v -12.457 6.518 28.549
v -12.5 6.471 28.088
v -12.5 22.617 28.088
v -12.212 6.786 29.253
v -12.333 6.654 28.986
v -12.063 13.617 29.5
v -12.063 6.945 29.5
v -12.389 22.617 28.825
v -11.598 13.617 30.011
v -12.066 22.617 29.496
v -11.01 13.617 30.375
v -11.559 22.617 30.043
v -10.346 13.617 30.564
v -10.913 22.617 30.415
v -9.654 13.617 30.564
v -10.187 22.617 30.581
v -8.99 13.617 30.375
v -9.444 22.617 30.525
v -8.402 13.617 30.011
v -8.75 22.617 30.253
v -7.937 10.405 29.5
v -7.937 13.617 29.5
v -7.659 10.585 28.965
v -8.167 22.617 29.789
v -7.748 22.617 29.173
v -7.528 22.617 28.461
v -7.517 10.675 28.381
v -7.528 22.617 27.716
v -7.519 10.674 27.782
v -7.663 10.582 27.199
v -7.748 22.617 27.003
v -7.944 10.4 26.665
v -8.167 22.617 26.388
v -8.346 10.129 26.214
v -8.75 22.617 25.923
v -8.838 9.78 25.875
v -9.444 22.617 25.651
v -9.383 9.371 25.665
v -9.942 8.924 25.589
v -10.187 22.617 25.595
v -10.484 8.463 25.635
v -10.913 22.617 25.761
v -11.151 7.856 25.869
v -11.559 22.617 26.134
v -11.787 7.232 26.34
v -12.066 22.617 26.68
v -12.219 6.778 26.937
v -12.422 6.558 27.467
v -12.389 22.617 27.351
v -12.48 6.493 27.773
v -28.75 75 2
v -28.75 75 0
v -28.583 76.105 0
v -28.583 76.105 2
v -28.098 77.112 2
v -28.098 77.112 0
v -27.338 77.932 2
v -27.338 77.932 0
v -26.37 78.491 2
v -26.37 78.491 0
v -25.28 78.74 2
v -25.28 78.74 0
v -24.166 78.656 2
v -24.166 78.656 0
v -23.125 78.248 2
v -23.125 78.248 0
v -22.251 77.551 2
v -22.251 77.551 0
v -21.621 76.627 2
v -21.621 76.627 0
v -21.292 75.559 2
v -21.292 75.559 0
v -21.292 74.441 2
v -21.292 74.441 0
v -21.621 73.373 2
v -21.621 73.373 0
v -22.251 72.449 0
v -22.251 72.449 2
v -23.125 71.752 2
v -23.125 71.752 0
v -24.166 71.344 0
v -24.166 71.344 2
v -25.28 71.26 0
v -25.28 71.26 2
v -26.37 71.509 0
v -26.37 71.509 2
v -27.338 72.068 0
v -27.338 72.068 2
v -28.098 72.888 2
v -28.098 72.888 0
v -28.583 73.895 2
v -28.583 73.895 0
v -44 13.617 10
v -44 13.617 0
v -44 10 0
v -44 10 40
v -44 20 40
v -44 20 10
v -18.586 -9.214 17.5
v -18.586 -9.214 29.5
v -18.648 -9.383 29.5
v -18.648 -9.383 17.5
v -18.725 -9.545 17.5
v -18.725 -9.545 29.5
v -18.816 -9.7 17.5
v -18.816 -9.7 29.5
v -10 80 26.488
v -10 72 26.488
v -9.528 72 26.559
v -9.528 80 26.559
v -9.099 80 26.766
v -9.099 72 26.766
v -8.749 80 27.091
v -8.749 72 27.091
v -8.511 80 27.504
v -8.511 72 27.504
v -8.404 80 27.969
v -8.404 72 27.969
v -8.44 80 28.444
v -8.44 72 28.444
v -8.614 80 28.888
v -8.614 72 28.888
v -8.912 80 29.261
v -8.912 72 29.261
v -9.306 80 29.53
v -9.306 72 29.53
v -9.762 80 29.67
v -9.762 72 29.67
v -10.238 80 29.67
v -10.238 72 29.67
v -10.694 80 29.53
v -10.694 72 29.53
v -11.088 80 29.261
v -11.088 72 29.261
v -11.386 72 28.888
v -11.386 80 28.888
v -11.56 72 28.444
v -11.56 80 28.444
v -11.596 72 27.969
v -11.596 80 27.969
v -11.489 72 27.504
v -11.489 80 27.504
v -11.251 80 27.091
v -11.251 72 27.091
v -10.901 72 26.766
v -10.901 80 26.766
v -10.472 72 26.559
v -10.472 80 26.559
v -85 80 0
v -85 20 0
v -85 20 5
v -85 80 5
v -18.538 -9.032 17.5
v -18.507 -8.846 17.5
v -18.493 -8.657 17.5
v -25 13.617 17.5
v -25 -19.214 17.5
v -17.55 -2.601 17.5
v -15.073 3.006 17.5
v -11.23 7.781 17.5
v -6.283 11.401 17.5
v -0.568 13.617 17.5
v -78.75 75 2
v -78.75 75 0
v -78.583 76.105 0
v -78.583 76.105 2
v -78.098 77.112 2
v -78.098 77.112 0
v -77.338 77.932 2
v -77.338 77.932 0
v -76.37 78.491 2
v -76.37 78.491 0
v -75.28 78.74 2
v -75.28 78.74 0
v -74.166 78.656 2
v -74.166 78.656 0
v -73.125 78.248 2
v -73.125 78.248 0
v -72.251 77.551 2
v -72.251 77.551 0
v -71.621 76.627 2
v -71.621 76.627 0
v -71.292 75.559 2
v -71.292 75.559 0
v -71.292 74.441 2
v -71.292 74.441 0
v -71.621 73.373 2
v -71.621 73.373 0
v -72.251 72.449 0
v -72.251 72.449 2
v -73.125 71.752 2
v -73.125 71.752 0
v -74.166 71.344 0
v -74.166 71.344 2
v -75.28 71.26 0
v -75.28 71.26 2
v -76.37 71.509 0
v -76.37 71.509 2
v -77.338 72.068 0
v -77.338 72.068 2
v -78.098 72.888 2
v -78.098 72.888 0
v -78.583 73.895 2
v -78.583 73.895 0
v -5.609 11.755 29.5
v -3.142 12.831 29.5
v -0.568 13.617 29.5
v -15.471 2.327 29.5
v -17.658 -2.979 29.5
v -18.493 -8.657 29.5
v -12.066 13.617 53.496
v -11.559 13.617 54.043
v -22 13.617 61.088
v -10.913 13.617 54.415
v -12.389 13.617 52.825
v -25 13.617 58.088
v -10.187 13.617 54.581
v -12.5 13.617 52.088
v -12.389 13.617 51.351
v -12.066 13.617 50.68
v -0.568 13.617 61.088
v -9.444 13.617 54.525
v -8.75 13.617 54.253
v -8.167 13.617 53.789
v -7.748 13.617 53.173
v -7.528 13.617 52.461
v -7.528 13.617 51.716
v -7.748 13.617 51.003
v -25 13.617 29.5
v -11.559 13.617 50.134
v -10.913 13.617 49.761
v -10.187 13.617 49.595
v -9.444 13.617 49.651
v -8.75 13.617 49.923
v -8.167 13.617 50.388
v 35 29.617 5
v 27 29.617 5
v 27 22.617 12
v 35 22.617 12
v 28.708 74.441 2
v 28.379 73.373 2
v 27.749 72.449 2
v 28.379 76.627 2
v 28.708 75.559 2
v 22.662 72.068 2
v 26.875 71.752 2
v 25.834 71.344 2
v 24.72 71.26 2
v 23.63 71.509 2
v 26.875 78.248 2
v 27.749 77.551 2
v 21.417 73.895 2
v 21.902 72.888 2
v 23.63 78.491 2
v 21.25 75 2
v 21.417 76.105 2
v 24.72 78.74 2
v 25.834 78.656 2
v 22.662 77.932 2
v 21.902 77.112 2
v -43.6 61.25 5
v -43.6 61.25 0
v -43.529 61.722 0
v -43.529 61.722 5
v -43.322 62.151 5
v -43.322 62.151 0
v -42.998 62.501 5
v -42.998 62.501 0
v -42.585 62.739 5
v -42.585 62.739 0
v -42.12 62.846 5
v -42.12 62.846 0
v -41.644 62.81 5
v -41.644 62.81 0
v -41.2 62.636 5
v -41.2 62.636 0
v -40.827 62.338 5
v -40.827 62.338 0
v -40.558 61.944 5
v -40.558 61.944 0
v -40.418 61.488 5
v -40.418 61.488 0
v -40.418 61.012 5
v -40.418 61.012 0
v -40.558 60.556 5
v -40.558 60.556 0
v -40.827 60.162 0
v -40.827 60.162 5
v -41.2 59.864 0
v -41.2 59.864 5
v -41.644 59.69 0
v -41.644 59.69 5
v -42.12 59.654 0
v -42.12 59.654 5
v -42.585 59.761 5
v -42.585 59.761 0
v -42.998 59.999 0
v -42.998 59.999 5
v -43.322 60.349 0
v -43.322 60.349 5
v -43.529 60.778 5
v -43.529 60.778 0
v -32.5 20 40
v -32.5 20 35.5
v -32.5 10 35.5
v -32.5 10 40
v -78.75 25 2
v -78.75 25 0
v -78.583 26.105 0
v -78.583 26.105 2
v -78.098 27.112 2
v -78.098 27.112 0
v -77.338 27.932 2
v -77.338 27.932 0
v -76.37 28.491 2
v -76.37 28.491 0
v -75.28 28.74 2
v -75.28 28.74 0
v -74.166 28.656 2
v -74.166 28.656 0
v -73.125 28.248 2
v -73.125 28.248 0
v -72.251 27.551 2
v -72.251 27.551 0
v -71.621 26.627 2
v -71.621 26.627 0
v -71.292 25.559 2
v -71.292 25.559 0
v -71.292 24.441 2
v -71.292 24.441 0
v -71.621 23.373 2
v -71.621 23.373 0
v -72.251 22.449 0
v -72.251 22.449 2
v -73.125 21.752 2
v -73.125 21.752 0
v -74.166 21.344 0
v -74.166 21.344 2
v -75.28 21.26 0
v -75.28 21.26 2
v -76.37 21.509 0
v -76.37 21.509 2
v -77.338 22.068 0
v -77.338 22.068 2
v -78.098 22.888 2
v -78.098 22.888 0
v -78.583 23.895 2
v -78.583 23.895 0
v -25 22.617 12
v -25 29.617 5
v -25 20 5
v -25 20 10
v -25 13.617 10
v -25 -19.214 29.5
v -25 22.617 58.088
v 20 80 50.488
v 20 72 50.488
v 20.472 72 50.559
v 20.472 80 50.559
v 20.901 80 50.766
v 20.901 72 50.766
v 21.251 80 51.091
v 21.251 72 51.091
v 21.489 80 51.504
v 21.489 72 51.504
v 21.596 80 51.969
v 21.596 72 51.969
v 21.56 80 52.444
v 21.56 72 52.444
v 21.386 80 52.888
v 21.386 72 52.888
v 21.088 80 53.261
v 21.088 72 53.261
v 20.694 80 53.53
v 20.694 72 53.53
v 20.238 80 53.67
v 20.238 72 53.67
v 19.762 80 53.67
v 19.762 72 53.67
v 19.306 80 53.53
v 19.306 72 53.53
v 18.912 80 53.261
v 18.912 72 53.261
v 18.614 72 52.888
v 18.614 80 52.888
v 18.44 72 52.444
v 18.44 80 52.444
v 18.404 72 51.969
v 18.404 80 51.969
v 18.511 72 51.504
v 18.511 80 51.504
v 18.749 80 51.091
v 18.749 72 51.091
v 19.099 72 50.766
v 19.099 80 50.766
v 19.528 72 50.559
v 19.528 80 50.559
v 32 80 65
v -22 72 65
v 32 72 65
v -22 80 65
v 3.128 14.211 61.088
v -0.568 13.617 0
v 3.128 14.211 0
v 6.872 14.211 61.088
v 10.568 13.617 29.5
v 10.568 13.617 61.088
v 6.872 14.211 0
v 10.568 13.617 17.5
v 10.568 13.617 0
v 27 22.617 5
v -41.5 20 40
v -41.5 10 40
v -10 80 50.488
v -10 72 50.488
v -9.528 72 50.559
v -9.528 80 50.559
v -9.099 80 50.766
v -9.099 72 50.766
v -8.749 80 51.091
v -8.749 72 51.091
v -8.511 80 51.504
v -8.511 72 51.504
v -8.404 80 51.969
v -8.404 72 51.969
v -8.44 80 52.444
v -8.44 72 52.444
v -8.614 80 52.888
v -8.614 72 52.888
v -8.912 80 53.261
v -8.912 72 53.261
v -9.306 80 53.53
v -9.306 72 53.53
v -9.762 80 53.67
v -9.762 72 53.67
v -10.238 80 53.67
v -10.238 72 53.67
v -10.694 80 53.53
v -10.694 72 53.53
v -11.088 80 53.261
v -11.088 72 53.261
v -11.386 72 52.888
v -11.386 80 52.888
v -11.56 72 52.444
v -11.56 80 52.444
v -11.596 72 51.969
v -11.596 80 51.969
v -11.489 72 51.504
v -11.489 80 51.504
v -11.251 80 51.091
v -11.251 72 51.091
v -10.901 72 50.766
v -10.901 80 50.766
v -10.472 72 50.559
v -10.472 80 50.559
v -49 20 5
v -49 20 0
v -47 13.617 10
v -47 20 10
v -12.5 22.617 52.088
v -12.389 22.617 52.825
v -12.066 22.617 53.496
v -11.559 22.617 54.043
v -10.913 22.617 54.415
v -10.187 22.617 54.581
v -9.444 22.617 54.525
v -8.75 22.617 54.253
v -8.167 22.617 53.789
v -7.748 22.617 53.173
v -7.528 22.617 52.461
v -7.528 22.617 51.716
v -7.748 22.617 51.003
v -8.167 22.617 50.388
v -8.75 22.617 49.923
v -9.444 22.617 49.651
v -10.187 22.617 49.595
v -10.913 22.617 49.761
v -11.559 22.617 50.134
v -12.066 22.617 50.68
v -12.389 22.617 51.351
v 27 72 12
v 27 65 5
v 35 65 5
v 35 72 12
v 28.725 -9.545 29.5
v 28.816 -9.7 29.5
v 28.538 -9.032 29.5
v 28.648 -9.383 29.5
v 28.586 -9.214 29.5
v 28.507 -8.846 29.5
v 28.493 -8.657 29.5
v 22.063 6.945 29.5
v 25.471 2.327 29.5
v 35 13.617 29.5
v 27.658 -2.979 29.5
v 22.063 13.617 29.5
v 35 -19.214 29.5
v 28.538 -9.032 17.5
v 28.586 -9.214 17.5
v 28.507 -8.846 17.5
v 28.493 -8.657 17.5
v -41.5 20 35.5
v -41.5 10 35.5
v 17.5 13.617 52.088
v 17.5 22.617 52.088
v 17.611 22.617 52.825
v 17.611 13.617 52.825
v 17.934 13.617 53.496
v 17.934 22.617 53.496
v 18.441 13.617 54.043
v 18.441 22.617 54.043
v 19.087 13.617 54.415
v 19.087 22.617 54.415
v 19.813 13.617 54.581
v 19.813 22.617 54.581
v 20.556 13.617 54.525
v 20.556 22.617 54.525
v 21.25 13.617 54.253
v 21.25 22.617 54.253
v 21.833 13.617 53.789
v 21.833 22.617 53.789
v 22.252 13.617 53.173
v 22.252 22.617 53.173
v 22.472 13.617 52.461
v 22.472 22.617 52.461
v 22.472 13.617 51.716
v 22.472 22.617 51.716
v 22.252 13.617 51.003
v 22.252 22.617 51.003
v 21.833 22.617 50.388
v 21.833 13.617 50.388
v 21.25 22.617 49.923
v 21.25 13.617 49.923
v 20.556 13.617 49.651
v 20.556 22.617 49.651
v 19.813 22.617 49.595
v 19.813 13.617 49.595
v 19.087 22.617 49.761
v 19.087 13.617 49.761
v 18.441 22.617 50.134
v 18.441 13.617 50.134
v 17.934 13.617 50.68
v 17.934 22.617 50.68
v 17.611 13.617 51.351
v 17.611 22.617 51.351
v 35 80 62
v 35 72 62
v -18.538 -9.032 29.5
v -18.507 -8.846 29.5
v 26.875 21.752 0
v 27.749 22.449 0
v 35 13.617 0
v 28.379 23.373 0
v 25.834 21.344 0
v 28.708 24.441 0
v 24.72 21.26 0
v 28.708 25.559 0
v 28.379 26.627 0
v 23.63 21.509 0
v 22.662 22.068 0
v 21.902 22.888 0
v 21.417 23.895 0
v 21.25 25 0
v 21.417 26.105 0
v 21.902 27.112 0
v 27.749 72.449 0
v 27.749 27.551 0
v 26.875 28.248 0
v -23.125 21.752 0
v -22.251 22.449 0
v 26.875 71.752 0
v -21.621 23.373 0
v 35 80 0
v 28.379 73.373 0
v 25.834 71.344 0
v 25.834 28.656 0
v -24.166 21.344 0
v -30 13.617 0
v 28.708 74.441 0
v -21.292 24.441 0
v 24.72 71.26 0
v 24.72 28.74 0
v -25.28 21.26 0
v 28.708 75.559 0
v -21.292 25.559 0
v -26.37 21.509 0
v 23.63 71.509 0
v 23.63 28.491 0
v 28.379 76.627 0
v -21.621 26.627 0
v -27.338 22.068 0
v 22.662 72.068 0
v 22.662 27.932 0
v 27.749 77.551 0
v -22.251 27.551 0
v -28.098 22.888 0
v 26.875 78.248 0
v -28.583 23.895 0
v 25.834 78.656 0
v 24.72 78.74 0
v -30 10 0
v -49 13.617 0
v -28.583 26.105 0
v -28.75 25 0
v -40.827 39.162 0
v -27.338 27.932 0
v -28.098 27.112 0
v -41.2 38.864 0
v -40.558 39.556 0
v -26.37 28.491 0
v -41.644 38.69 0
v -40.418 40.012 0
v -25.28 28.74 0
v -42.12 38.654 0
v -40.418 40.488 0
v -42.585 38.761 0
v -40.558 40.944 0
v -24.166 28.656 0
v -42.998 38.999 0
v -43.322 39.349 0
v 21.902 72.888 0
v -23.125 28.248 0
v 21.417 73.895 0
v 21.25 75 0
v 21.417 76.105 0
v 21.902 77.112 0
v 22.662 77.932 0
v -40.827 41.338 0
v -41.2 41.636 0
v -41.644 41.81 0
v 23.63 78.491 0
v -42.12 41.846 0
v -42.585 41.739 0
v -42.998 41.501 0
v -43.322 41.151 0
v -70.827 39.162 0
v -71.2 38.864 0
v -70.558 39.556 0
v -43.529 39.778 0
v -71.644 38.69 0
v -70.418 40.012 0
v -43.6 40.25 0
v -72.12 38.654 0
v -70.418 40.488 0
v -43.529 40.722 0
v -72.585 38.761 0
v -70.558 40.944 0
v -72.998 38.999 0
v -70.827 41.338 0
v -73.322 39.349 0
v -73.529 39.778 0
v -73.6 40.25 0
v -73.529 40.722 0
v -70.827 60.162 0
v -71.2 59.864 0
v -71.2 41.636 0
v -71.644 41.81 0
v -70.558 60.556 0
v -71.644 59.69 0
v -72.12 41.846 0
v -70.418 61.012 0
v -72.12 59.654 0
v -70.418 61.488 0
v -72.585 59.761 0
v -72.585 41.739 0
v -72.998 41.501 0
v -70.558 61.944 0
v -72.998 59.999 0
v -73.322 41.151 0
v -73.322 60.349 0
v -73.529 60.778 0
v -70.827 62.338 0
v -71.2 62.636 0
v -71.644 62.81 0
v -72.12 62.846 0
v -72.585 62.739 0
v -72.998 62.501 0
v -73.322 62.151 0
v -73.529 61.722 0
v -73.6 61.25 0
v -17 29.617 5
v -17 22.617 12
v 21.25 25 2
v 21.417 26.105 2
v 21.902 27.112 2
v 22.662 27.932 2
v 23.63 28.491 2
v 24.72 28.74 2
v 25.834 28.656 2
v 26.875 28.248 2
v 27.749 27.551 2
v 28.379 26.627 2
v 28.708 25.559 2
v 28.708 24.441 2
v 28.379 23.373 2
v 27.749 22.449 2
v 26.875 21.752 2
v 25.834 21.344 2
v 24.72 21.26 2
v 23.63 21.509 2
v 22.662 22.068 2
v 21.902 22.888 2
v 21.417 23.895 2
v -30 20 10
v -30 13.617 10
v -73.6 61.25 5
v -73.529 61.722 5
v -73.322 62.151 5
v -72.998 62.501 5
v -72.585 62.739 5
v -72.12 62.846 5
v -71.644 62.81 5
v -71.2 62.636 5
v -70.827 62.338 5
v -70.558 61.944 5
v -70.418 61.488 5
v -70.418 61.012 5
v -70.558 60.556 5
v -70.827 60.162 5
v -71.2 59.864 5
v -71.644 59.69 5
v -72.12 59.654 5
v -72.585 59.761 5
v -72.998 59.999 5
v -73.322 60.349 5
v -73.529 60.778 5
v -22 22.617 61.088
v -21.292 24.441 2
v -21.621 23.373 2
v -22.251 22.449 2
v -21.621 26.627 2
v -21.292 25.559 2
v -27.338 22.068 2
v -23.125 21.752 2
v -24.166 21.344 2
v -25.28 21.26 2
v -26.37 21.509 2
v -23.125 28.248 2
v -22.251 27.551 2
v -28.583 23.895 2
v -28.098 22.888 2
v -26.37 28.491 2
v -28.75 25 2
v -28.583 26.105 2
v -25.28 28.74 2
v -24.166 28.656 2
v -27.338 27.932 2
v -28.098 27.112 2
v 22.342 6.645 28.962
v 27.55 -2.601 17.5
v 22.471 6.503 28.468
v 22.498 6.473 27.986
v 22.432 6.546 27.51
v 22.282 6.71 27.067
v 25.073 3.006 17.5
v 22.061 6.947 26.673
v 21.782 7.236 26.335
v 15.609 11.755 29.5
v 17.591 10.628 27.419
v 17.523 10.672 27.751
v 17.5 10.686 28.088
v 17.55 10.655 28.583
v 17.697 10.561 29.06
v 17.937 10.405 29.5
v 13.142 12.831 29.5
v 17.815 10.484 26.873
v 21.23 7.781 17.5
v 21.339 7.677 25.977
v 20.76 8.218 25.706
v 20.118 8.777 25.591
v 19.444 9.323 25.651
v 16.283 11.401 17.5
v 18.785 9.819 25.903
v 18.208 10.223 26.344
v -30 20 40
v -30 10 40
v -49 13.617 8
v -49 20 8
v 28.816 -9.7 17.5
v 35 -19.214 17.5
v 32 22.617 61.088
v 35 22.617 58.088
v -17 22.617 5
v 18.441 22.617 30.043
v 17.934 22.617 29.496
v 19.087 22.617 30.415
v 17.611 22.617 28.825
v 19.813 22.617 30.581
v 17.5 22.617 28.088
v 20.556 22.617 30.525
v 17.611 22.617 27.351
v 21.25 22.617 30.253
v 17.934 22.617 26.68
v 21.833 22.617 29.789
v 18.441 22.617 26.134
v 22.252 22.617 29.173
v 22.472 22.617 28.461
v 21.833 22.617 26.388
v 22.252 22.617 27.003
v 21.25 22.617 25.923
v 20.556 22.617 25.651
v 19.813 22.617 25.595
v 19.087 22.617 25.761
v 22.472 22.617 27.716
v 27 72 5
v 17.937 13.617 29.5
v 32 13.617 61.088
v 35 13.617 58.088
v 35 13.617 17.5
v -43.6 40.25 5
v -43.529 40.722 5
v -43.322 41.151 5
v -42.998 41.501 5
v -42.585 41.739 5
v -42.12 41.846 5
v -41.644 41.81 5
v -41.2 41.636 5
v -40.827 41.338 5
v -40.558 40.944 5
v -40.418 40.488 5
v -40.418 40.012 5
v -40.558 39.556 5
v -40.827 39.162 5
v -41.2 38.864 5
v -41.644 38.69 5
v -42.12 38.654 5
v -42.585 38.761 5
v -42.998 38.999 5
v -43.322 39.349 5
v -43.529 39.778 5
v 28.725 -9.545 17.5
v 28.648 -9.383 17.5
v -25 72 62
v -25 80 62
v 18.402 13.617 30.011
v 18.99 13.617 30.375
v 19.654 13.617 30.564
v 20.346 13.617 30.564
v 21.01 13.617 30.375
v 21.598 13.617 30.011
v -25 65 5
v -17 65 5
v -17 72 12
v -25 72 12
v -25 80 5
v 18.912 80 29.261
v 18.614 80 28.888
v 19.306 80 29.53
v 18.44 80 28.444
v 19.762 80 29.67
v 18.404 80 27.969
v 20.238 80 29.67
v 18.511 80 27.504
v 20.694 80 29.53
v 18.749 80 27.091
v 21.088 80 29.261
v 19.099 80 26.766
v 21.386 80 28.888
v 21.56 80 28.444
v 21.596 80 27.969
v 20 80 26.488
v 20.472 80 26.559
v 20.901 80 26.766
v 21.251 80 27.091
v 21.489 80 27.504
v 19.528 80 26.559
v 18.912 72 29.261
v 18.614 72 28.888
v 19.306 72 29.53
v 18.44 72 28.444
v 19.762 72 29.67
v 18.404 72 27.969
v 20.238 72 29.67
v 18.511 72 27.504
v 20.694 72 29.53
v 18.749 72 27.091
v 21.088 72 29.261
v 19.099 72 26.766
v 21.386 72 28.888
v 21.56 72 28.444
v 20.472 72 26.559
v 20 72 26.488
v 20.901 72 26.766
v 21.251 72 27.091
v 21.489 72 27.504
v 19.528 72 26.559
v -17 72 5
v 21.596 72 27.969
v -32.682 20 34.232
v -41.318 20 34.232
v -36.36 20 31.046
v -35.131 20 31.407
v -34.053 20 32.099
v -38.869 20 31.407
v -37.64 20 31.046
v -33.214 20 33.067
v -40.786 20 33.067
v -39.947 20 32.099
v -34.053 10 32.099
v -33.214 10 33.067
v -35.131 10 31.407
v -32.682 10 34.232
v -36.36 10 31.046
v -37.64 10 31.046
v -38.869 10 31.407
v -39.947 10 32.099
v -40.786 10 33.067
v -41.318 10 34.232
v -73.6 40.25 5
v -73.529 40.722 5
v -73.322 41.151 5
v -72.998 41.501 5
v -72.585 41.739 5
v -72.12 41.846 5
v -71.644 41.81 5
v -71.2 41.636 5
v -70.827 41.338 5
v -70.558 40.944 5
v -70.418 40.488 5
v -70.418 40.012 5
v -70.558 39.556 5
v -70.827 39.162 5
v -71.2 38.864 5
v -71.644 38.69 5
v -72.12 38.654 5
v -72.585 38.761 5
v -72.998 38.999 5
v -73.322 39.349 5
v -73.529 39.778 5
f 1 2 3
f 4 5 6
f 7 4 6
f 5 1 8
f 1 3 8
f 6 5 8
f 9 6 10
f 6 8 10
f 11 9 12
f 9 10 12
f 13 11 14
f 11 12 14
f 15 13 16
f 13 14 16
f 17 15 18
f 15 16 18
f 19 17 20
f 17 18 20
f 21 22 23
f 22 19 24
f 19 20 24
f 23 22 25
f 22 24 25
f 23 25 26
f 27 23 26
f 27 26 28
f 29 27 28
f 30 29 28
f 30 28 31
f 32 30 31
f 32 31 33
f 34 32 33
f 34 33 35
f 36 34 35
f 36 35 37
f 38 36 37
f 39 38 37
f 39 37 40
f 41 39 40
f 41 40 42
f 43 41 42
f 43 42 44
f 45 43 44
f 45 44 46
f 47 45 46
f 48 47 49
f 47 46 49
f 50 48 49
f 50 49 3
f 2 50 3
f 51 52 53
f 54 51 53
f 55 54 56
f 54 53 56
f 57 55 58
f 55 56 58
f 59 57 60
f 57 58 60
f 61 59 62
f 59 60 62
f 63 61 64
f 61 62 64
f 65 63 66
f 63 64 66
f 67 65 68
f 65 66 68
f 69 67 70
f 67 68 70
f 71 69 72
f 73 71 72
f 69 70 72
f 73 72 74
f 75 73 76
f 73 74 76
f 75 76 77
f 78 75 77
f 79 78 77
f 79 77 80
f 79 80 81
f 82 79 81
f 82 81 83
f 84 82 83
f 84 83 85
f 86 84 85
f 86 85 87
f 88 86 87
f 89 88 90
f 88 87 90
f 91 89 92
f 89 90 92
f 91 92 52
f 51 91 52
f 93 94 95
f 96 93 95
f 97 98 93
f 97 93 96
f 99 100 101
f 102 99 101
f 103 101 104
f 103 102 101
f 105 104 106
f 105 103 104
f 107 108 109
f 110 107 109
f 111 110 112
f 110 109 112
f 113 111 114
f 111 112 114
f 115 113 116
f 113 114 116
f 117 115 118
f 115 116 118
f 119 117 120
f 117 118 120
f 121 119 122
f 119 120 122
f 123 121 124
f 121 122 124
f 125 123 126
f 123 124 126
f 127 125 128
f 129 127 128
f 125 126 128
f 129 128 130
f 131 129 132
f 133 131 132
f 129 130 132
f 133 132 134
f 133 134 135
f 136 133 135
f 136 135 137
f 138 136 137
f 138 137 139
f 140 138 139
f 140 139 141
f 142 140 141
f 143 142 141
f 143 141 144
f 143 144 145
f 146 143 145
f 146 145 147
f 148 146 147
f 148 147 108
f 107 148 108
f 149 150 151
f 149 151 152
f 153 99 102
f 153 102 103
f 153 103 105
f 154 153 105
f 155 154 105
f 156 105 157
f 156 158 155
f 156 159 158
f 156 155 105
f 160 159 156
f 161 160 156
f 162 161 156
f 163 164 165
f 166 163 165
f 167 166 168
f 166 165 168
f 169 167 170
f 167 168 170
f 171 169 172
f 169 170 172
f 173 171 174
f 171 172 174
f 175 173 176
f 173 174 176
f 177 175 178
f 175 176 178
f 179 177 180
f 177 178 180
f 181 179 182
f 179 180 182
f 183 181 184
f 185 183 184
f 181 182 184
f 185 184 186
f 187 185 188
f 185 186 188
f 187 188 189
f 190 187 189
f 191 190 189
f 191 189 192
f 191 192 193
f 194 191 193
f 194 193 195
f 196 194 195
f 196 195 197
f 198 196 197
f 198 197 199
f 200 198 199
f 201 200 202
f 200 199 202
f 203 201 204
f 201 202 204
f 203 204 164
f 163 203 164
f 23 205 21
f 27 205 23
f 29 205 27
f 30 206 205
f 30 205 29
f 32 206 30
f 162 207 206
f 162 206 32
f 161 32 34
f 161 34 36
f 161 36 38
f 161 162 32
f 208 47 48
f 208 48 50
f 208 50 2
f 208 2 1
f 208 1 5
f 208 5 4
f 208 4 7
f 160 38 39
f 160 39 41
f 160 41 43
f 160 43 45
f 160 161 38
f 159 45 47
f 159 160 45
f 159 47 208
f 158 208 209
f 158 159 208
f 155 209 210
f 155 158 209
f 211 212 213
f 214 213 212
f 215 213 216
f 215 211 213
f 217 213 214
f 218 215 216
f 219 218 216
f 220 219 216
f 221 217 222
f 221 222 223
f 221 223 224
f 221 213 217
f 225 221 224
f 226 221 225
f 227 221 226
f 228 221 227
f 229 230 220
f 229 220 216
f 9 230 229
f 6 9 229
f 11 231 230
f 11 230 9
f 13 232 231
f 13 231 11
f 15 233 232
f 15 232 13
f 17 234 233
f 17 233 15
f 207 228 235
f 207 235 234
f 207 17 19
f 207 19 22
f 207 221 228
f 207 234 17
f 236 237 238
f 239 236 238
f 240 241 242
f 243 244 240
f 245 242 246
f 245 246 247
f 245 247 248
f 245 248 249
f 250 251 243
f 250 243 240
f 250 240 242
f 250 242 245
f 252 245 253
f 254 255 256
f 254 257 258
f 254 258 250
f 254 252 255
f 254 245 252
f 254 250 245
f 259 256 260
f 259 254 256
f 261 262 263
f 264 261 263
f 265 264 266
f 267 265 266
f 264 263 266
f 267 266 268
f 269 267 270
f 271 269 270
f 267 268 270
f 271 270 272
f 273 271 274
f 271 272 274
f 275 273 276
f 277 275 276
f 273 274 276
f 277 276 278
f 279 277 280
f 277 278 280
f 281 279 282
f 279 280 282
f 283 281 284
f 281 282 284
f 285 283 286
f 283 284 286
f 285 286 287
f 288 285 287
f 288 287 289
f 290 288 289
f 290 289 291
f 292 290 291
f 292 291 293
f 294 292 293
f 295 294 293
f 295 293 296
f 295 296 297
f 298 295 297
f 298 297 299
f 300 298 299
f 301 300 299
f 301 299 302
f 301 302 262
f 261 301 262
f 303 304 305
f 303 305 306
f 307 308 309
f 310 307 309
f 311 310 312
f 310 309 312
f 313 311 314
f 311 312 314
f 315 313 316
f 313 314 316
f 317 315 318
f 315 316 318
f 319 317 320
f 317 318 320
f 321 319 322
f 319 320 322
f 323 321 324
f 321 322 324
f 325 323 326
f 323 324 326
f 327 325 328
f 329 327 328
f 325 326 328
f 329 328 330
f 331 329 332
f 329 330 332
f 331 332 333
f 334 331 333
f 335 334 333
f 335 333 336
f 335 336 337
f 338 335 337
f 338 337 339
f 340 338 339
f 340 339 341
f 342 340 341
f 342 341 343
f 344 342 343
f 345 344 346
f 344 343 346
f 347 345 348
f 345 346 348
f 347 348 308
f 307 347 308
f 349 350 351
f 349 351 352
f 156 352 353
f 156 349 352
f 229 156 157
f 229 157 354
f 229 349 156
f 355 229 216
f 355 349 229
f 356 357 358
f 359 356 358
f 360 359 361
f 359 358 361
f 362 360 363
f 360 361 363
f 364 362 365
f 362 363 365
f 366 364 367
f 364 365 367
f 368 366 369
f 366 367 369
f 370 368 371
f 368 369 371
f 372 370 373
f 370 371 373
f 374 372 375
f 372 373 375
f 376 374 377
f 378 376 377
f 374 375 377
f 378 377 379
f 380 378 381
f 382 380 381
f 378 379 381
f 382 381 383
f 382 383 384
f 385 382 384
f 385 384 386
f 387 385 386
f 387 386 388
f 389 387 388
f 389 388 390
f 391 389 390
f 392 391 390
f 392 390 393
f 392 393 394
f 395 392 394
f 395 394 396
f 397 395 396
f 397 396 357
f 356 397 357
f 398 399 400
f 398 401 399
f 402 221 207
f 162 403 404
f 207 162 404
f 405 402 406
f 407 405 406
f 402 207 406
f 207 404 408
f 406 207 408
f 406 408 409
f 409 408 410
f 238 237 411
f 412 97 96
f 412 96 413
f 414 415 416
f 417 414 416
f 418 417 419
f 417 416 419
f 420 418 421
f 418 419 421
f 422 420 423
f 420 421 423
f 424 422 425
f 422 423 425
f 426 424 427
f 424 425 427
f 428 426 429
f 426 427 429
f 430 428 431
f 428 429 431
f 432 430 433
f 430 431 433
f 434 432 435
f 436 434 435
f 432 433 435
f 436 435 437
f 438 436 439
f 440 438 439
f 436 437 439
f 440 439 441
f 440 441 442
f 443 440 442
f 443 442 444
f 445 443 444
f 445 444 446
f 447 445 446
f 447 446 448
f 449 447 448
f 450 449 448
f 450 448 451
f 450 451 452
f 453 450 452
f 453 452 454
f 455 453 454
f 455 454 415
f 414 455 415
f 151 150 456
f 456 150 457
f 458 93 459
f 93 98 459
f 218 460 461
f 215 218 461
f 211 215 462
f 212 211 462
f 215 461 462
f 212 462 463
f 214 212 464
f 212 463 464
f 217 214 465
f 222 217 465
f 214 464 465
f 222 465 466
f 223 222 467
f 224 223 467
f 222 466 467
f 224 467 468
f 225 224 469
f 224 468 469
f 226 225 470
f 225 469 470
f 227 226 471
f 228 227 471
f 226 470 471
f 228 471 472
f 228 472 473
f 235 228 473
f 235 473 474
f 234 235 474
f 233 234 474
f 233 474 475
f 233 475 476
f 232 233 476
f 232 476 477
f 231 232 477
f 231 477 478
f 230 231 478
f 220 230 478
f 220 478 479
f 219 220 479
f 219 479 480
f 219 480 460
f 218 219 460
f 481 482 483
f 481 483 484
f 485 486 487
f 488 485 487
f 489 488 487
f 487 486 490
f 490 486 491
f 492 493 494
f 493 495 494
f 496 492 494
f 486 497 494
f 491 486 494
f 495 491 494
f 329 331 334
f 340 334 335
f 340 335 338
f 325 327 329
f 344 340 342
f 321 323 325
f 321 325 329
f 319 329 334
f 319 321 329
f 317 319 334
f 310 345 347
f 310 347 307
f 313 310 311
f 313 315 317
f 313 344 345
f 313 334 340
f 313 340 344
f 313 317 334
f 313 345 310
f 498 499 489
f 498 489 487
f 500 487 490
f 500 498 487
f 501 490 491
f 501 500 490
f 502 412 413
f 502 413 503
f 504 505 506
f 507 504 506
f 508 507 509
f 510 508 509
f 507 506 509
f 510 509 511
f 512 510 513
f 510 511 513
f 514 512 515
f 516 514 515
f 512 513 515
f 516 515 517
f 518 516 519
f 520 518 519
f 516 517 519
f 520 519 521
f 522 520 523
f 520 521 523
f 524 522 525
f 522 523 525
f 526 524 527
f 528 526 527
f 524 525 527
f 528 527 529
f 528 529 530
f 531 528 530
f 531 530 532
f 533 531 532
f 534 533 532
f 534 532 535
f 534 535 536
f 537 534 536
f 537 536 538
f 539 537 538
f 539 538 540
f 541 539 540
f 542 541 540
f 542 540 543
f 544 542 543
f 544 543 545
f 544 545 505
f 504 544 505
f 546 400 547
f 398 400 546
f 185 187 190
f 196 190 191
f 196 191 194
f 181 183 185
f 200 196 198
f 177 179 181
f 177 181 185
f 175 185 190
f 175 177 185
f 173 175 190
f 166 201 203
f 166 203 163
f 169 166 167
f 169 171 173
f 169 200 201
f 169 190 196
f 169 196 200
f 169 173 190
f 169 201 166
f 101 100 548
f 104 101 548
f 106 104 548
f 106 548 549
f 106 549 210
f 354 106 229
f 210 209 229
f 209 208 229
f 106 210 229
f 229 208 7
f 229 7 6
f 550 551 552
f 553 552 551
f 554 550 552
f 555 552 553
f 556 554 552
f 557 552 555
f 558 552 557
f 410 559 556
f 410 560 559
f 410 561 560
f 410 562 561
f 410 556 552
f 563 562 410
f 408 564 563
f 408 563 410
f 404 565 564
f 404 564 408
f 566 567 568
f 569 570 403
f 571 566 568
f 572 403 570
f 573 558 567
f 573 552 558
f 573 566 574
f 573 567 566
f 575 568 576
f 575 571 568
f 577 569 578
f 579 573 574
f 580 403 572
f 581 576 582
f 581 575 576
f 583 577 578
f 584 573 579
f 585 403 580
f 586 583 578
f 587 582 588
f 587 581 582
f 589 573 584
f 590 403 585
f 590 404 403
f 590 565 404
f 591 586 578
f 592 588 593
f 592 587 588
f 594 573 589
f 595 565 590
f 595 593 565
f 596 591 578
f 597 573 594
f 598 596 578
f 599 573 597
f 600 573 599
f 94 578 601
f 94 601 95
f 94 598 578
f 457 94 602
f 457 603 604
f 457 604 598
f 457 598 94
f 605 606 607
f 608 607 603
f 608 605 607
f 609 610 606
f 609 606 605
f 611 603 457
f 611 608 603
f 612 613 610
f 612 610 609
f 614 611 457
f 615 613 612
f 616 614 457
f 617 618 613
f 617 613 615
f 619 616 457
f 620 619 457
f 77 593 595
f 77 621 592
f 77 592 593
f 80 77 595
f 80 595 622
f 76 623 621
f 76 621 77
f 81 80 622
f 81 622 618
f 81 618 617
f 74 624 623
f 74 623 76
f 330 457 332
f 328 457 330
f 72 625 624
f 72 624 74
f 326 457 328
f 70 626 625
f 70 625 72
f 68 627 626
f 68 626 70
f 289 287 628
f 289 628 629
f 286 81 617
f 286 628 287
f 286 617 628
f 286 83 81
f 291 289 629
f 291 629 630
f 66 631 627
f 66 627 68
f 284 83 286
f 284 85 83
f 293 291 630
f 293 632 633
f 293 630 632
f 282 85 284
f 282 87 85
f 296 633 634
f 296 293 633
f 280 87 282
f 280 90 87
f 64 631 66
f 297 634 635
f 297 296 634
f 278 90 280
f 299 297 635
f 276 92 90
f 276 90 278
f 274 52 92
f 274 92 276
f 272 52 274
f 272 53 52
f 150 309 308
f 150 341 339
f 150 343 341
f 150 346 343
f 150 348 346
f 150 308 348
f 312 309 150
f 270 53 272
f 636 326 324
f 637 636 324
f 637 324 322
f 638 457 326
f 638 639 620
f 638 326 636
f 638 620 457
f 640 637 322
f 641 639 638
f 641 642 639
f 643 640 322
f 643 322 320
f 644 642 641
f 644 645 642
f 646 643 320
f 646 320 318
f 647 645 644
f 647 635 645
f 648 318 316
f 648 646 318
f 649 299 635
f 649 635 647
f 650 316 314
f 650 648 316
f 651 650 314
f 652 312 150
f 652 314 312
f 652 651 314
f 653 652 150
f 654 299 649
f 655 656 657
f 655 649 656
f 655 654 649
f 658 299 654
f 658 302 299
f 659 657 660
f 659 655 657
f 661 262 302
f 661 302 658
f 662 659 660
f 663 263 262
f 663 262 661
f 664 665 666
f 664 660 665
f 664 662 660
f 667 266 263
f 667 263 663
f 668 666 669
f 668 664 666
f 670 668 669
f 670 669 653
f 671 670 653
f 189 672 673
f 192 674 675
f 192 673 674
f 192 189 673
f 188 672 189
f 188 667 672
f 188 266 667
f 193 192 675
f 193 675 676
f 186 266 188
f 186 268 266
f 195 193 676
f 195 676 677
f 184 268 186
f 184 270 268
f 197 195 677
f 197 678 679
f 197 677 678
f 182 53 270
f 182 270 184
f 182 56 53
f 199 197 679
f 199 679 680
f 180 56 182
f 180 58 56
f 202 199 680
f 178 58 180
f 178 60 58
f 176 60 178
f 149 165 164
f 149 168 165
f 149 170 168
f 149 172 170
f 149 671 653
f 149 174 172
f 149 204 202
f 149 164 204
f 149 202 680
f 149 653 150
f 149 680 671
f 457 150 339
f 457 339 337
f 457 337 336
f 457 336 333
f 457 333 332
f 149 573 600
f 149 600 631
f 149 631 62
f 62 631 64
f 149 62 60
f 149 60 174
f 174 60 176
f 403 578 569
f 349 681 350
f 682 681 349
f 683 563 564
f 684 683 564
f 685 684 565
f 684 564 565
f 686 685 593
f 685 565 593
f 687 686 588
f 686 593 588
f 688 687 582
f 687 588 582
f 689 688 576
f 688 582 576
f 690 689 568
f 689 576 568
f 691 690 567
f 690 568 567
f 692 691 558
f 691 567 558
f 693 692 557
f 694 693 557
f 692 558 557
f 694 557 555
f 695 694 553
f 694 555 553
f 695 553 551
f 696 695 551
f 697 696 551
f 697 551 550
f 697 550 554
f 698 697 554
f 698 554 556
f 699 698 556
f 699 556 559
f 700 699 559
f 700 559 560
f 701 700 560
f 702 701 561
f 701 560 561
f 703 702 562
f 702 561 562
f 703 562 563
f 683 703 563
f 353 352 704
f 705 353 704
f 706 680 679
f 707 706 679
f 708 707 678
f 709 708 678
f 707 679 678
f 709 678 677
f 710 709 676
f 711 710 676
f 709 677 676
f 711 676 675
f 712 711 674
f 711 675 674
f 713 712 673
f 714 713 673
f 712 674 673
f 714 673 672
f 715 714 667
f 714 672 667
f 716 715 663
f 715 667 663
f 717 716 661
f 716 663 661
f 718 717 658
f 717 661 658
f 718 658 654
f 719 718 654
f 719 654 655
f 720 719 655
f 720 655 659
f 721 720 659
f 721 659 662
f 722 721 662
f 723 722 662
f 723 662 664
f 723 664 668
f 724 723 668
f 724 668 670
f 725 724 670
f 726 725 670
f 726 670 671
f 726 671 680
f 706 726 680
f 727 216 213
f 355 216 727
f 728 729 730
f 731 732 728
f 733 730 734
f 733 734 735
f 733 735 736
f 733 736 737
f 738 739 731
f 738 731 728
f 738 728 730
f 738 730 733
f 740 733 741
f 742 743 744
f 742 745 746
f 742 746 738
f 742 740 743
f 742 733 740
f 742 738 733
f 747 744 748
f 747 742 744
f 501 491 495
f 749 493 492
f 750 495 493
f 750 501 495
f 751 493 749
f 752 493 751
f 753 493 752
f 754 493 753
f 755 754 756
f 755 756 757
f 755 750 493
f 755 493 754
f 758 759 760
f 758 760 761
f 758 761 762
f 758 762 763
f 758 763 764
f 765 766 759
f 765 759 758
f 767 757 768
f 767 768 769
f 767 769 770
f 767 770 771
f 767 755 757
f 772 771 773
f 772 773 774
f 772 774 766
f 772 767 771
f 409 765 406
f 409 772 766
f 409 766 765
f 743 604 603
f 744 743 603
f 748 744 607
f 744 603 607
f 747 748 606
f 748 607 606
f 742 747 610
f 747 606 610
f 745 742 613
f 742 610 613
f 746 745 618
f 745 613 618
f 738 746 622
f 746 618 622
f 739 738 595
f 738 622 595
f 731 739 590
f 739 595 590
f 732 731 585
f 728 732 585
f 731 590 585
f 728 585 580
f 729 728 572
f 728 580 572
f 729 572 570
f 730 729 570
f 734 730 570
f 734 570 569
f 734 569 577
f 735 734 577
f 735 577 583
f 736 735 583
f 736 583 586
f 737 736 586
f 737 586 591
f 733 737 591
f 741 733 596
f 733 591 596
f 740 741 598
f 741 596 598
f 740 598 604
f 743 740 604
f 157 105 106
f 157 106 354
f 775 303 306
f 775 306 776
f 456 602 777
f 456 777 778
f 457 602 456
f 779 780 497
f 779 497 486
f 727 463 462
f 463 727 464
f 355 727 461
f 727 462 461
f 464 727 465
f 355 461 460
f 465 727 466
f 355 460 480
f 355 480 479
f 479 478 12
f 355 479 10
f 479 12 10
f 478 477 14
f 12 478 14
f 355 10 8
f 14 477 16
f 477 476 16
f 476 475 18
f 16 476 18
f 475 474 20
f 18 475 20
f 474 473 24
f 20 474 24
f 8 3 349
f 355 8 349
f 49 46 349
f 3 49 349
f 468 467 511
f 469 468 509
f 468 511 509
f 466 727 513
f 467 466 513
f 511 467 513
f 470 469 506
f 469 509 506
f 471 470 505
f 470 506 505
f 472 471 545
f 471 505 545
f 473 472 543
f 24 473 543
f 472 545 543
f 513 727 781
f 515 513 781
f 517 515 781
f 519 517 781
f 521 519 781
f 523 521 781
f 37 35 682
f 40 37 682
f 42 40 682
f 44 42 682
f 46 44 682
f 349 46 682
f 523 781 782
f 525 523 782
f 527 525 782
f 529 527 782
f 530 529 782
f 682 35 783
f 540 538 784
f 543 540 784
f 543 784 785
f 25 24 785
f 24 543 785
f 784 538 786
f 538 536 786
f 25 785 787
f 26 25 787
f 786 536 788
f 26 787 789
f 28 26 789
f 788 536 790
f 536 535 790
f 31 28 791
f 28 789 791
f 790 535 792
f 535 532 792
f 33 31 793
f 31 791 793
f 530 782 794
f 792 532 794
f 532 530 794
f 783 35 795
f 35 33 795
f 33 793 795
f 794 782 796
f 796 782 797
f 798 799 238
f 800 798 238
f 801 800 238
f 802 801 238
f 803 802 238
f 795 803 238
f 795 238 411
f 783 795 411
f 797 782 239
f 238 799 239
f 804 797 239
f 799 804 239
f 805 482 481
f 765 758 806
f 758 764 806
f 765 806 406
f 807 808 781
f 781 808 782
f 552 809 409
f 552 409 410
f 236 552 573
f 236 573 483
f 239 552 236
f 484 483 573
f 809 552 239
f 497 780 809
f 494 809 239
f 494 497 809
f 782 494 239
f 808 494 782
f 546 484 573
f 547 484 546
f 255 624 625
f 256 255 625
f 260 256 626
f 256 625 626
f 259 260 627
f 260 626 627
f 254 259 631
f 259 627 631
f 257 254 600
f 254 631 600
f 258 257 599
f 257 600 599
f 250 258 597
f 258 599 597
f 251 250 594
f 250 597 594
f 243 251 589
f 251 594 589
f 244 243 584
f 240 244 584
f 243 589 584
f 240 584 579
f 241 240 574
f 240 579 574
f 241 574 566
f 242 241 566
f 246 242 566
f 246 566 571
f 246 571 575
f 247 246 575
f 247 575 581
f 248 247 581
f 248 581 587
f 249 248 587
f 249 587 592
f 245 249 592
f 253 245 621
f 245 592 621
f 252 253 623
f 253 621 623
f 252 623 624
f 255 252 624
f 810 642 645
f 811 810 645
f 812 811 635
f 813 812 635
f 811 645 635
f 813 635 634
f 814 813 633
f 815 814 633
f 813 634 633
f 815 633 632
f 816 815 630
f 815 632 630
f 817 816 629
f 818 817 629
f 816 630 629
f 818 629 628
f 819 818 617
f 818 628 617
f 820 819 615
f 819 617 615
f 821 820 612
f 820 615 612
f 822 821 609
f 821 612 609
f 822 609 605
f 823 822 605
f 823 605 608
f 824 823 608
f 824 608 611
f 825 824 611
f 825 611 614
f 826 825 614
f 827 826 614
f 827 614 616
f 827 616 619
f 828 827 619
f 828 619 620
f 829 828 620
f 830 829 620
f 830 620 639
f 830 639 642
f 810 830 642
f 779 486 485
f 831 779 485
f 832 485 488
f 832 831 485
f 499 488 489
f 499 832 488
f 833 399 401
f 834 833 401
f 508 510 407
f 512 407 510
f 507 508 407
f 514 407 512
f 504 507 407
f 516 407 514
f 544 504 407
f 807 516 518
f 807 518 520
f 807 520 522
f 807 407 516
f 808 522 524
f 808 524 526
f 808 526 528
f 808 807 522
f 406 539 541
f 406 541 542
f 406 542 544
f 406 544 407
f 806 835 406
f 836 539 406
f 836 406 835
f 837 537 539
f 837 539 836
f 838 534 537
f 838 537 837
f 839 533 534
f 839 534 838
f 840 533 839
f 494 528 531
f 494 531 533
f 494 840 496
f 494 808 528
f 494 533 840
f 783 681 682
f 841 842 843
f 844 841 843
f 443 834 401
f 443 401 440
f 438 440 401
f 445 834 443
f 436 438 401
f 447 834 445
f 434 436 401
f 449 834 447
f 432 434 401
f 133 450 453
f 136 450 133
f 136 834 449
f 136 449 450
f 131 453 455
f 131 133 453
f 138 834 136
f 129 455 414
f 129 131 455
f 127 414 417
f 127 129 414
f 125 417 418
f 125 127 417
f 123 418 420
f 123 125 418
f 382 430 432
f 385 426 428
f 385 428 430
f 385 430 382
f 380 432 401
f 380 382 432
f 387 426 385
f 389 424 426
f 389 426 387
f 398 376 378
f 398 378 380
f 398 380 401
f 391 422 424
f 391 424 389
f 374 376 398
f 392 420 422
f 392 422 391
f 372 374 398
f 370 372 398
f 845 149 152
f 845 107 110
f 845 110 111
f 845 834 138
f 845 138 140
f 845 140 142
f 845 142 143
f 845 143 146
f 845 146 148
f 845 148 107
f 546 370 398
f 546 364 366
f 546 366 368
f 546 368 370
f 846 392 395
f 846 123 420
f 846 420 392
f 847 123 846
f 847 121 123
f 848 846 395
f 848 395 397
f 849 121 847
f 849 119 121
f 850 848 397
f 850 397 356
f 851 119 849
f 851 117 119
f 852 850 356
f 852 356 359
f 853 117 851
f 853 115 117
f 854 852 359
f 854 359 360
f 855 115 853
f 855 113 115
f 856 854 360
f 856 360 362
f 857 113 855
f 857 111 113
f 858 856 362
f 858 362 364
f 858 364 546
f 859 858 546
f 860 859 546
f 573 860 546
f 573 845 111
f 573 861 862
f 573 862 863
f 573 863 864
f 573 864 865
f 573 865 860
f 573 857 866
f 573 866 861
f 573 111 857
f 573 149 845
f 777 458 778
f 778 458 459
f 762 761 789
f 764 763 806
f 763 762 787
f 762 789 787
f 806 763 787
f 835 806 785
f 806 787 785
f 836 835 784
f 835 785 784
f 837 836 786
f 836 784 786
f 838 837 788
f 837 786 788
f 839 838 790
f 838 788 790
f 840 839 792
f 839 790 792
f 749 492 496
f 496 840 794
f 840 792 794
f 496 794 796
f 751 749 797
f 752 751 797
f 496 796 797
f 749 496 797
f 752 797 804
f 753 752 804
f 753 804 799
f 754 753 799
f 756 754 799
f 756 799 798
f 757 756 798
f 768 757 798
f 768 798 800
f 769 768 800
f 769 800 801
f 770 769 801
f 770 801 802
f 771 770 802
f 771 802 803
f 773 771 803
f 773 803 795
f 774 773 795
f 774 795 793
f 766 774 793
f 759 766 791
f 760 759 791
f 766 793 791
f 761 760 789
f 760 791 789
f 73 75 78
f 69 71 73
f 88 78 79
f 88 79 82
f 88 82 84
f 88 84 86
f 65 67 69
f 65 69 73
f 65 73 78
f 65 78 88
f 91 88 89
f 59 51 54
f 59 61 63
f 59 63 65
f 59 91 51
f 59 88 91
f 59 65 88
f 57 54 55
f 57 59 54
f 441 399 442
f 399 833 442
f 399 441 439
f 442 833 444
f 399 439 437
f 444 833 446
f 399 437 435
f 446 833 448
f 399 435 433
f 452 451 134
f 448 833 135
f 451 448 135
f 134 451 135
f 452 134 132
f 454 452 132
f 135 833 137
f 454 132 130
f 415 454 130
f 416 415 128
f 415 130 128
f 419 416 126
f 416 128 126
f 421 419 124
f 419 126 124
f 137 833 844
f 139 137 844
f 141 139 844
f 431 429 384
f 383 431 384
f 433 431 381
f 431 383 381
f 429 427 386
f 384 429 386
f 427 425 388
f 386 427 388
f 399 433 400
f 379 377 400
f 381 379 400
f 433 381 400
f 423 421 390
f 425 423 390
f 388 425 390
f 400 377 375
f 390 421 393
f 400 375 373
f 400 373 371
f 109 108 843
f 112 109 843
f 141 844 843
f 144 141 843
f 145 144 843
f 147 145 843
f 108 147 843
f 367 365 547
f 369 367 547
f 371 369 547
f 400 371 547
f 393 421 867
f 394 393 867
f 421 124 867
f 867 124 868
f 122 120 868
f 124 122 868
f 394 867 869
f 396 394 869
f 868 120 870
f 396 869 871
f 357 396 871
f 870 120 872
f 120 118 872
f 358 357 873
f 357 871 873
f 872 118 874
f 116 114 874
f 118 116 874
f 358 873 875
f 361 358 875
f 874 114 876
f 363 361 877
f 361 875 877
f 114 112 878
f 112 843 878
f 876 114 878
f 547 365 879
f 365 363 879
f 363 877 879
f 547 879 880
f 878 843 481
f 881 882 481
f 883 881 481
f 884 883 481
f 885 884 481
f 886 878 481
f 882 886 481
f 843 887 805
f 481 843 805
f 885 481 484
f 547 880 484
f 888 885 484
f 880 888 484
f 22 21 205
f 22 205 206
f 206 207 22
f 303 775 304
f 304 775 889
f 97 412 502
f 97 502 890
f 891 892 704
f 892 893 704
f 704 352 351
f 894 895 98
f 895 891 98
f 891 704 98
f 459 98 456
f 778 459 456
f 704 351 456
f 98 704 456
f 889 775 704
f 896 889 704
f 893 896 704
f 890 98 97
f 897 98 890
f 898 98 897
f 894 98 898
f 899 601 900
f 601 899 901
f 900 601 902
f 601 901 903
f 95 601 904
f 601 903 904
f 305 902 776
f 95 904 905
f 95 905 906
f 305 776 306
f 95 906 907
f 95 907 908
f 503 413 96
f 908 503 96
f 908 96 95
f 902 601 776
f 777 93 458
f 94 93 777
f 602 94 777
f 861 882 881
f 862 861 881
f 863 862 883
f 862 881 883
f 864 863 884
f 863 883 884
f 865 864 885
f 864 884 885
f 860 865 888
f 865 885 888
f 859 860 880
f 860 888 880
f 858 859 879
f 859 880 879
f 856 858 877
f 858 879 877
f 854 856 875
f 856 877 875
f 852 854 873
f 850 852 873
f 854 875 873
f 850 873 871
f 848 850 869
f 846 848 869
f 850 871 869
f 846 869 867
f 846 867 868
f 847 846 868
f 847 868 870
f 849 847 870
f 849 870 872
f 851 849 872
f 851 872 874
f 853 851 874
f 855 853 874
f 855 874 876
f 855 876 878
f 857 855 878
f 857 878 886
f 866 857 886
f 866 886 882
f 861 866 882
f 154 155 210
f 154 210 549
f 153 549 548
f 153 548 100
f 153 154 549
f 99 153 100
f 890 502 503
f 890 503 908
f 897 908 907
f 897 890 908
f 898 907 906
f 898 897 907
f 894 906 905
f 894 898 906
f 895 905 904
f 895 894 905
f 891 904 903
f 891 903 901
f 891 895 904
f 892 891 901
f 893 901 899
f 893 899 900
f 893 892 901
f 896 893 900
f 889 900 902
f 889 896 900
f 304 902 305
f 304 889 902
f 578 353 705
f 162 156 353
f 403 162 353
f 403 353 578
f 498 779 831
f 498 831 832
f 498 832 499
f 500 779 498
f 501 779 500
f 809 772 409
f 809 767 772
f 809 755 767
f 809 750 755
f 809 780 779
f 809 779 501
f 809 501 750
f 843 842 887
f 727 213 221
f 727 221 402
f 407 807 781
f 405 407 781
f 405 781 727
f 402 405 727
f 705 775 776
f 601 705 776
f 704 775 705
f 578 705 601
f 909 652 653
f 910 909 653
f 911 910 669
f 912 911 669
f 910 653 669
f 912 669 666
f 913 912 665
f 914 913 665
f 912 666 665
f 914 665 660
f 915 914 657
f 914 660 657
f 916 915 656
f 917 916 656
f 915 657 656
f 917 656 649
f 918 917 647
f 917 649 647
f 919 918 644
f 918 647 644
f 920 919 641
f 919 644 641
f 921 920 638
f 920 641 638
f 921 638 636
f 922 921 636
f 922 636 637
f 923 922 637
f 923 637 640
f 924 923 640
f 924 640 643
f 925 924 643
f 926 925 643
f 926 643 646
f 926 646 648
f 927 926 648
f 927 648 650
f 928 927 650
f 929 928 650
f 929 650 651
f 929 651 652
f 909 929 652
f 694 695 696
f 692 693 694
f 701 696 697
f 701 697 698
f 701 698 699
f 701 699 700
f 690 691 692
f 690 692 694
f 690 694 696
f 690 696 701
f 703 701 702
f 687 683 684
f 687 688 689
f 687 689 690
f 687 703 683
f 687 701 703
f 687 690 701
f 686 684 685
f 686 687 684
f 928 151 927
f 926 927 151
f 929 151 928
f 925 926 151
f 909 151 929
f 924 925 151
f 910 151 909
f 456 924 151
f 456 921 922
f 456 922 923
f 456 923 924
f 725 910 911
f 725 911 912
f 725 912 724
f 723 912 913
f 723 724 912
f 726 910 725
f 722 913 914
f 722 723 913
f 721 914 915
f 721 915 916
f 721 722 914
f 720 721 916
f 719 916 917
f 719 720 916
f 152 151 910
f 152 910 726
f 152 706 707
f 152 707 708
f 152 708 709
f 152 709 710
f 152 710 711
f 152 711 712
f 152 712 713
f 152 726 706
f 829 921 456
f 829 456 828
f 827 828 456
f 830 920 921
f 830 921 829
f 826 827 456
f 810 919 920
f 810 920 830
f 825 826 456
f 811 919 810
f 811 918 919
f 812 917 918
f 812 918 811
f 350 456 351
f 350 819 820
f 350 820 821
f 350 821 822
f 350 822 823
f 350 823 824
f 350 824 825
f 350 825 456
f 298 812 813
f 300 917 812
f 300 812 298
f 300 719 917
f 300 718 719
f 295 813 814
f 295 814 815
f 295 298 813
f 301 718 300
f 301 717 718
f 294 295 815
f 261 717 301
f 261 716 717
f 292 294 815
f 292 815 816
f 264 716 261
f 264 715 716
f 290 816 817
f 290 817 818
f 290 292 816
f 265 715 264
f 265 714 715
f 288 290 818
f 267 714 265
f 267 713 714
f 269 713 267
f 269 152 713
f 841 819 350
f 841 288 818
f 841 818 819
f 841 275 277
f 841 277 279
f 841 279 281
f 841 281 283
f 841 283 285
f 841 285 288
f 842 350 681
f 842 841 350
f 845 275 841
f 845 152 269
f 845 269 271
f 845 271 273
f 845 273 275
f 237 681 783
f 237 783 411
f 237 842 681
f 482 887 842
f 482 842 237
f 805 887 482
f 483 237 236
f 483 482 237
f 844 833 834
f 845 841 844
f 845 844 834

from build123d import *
from build123d.topology import SkipClean

# Parameters (mm, degrees)
SKETCH_1_W               = 120
SKETCH_1_H               = 60
EXTRUDE_1_DEPTH          = 5
SKETCH_3_W               = 60
SKETCH_3_H               = 8
EXTRUDE_3_DEPTH          = 60
SKETCH_4_W               = 61.088110118
SKETCH_4_H               = 9
EXTRUDE_4_DEPTH          = 60
SKETCH_6_R               = 23.5
CUT_EXTRUDE_1_DEPTH      = 134.603892159
EXTRUDE_5_DEPTH          = 50
SKETCH_8_W               = 20.5
SKETCH_8_H               = 32.830920687
SKETCH_8_W_2             = 17.5
CUT_EXTRUDE_2_DEPTH      = 60
EXTRUDE_6_DEPTH          = 10
SKETCH_11_R              = 1.6
CUT_EXTRUDE_3_DEPTH      = 141.605734288
SKETCH_12_R              = 1.6
CUT_EXTRUDE_4_DEPTH      = 134.603892159
RIB_1_REACH              = 160.193
SKETCH_13_WALL_W         = 328.285335328
SKETCH_13_WALL_H         = 8
MIRROR_2_COPY_1_REACH    = 160.193
MIRROR_2_COPY_1_SKETCH_W = 328.285335328
MIRROR_2_COPY_1_SKETCH_H = 8
SKETCH_15_W              = 5
SKETCH_15_H              = 6.382962656
EXTRUDE_7_DEPTH          = 10
CHAMFER_2_SIZE           = 2
CHAMFER_3_SIZE           = 3
SKETCH_16_R              = 2.5
CUT_EXTRUDE_5_DEPTH      = 122.419950598
SKETCH_18_R              = 3.75
CUT_EXTRUDE_7_DEPTH      = 2


with BuildPart() as part:
    # 草图1 → 凸台-拉伸1 (new body)
    with BuildSketch(Plane.XY):
        with Locations((-25, 50)):
            Rectangle(SKETCH_1_W, SKETCH_1_H)
    extrude(amount=EXTRUDE_1_DEPTH)

    # 草图3 → 凸台-拉伸3 (add)
    with BuildSketch(Plane.XY.offset(5)):
        with Locations((5, 76)):
            Rectangle(SKETCH_3_W, SKETCH_3_H)
    extrude(amount=EXTRUDE_3_DEPTH)

    # 草图4 → 凸台-拉伸4 (add)
    with BuildSketch(Plane(origin=(35, 0, 0), x_dir=(0, 0, -1), z_dir=(1, 0, 0))):
        with Locations((-30.544055059, 18.117037344)):
            Rectangle(SKETCH_4_W, SKETCH_4_H)
    extrude(amount=-EXTRUDE_4_DEPTH)

    # 草图6 → 切除-拉伸1 (cut, through all)
    with BuildSketch(Plane(origin=(0, 0, 0), x_dir=(-1, 0, 0), z_dir=(0, 0, -1))):
        with Locations((-5, -9.213883343)):
            Circle(SKETCH_6_R)
    extrude(amount=-CUT_EXTRUDE_1_DEPTH, mode=Mode.SUBTRACT)

    # 草图7 → 凸台-拉伸5 (add)
    with SkipClean():  # the faces are left unmerged after this step: merging them gives an invalid solid
        with BuildSketch(Plane(origin=(0, 0, 0), x_dir=(-1, 0, 0), z_dir=(0, 0, -1))):
            with BuildLine():
                Line((-10.567680001, 13.617037344), (-35, 13.617037344))
                Line((-35, 13.617037344), (-35, -9.213883343))
                Line((-35, -9.213883343), (-28.586195427, -9.213883343))
                ThreePointArc((-28.586195427, -9.213883343), (-28.52007955, -8.938912115), (-28.493409427, -8.657364267))
                ThreePointArc((-28.493409427, -8.657364267), (-23.307757139, 5.51961687), (-10.567680001, 13.617037344))
            make_face()
            with BuildLine():
                Line((25, 13.617037344), (0.567680001, 13.617037344))
                ThreePointArc((0.567680001, 13.617037344), (13.307757139, 5.51961687), (18.493409427, -8.657364267))
                ThreePointArc((18.493409427, -8.657364267), (18.52007955, -8.938912115), (18.586195427, -9.213883343))
                Line((18.586195427, -9.213883343), (25, -9.213883343))
                Line((25, -9.213883343), (25, 13.617037344))
            make_face()
            with BuildLine():
                Line((25, -9.213883343), (18.586195427, -9.213883343))
                ThreePointArc((18.586195427, -9.213883343), (18.684669265, -9.464686705), (18.815961295, -9.699977643))
                Line((18.815961295, -9.699977643), (25, -19.213883343))
                Line((25, -19.213883343), (25, -9.213883343))
            make_face()
            with BuildLine():
                Line((-28.586195427, -9.213883343), (-35, -9.213883343))
                Line((-35, -9.213883343), (-35, -19.213883343))
                Line((-35, -19.213883343), (-28.815961295, -9.699977643))
                ThreePointArc((-28.815961295, -9.699977643), (-28.684669265, -9.464686705), (-28.586195427, -9.213883343))
            make_face()
        extrude(amount=-EXTRUDE_5_DEPTH)

    # 草图8 → 切除-拉伸2 (cut)
    with SkipClean():  # the faces are left unmerged after this step: merging them gives an invalid solid
        with BuildSketch(Plane(origin=(35, 0, 0), x_dir=(0, 0, -1), z_dir=(1, 0, 0))):
            with Locations((-39.75, -2.798423)):
                Rectangle(SKETCH_8_W, SKETCH_8_H)
            with Locations((-8.75, -2.798423)):
                Rectangle(SKETCH_8_W_2, SKETCH_8_H)
        extrude(amount=-CUT_EXTRUDE_2_DEPTH, mode=Mode.SUBTRACT)

    # 草图9 → 凸台-拉伸6 (add)
    with SkipClean():  # the faces are left unmerged after this step: merging them gives an invalid solid
        with BuildSketch(Plane.XZ.offset(-20)):
            with BuildLine():
                Line((-32.5, 0), (-41.5, 0))
                Line((-41.5, 0), (-44, 0))
                Line((-44, 0), (-44, 40))
                Line((-44, 40), (-41.5, 40))
                Line((-41.5, 40), (-41.5, 35.5))
                ThreePointArc((-41.5, 35.5), (-37, 31), (-32.5, 35.5))
                Line((-32.5, 35.5), (-32.5, 40))
                Line((-32.5, 40), (-30, 40))
                Line((-30, 40), (-30, 0))
                Line((-30, 0), (-32.5, 0))
            make_face()
        extrude(amount=EXTRUDE_6_DEPTH)

    # 草图11 → 切除-拉伸3 (cut, through all)
    with SkipClean():  # the faces are left unmerged after this step: merging them gives an invalid solid
        with BuildSketch(Plane(origin=(0, 72, 0), x_dir=(-1, 0, 0), z_dir=(0, -1, 0))):
            with Locations(Location((-20, -52.088110118, 0), (0, 0, 90))):
                Circle(SKETCH_11_R)
            with Locations(Location((10, -28.088110118, 0), (0, 0, 90))):
                Circle(SKETCH_11_R)
            with Locations(Location((-20, -28.088110118, 0), (0, 0, 90))):
                Circle(SKETCH_11_R)
            with Locations(Location((10, -52.088110118, 0), (0, 0, 90))):
                Circle(SKETCH_11_R)
        extrude(amount=-CUT_EXTRUDE_3_DEPTH, mode=Mode.SUBTRACT)

    # 草图12 → 切除-拉伸4 (cut, through all)
    with SkipClean():  # the faces are left unmerged after this step: merging them gives an invalid solid
        with BuildSketch(Plane(origin=(0, 0, 0), x_dir=(-1, 0, 0), z_dir=(0, 0, -1))):
            with Locations((42, 40.25)):
                Circle(SKETCH_12_R)
            with Locations((42, 61.25)):
                Circle(SKETCH_12_R)
            with Locations((72, 40.25)):
                Circle(SKETCH_12_R)
            with Locations((72, 61.25)):
                Circle(SKETCH_12_R)
        extrude(amount=-CUT_EXTRUDE_4_DEPTH, mode=Mode.SUBTRACT)

    # 草图13 wall → 筋1 (add, up to next)
    with BuildSketch(Plane(origin=(35, 68.5, 8.5), x_dir=(0, 0.707106781187, 0.707106781187), z_dir=(0, -0.707106781187, 0.707106781187)), mode=Mode.PRIVATE) as rib_1_sk1:
        with Locations((0, 4)):
            Rectangle(SKETCH_13_WALL_W, SKETCH_13_WALL_H)
    rib_1_tool1 = extrude(rib_1_sk1.sketch, amount=-RIB_1_REACH, mode=Mode.PRIVATE) - part.part
    rib_1 = rib_1_tool1.solids().sort_by_distance((35, 68.5, 8.5))[0]
    add(rib_1)

    # 镜向1: 筋1 across plane
    with SkipClean():  # the faces are left unmerged after this step: merging them gives an invalid solid
        add(rib_1.mirror(Plane(origin=(5, 0, 0), x_dir=(0, 0, 1), z_dir=(1, 0, 0))))

    # 镜向2: 筋1 across plane
    with SkipClean():  # the faces are left unmerged after this step: merging them gives an invalid solid
        add(rib_1.mirror(Plane(origin=(0, 47.308518672, 0), x_dir=(0, 0, 1), z_dir=(0, -1, 0))))

    # 镜向2 copy 1 sketch → 镜向2 copy 1 (add, up to next)
    with BuildSketch(Plane(origin=(-25, 26.117037344, 8.5), x_dir=(0, -0.7071067811870001, 0.7071067811869999), z_dir=(0, 0.7071067811869999, 0.7071067811870001)), mode=Mode.PRIVATE) as mirror_2_copy_1_sk1:
        with Locations((0, 4)):
            Rectangle(MIRROR_2_COPY_1_SKETCH_W, MIRROR_2_COPY_1_SKETCH_H)
    mirror_2_copy_1_tool1 = extrude(mirror_2_copy_1_sk1.sketch, amount=-MIRROR_2_COPY_1_REACH, mode=Mode.PRIVATE) - part.part
    add(mirror_2_copy_1_tool1.solids().sort_by_distance((-25, 26.117037344, 8.5))[0])

    # 草图15 → 凸台-拉伸7 (add)
    with SkipClean():  # the faces are left unmerged after this step: merging them gives an invalid solid
        with BuildSketch(Plane(origin=(0, 0, 0), x_dir=(-1, 0, 0), z_dir=(0, 0, -1))):
            with Locations((27.5, 16.808518672)):
                Rectangle(SKETCH_15_W, SKETCH_15_H)
            with Locations((46.5, 16.808518672)):
                Rectangle(SKETCH_15_W, SKETCH_15_H)
        extrude(amount=-EXTRUDE_7_DEPTH)

    # 倒角2
    chamfer_2_edges = [part.edges().sort_by_distance(p)[0] for p in [
        (-49, 16.808518672, 10),
    ]]
    chamfer(chamfer_2_edges, length=CHAMFER_2_SIZE)

    # 倒角3
    chamfer_3_edges = [part.edges().sort_by_distance(p)[0] for p in [
        (-25, 76, 65),
        (35, 76, 65),
        (35, 18.117037344, 61.088110118),
        (-25, 18.117037344, 61.088110118),
    ]]
    chamfer(chamfer_3_edges, length=CHAMFER_3_SIZE)

    # 草图16 → 切除-拉伸5 (cut, through all)
    with SkipClean():  # the faces are left unmerged after this step: merging them gives an invalid solid
        with BuildSketch(Plane(origin=(0, 22.617037344, 0), x_dir=(1, 0, 0), z_dir=(0, 1, 0))):
            with Locations(Location((20, -52.088110118, 0), (0, 0, 180))):
                Circle(SKETCH_16_R)
            with Locations(Location((-10, -52.088110118, 0), (0, 0, 180))):
                Circle(SKETCH_16_R)
            with Locations(Location((-10, -28.088110118, 0), (0, 0, 180))):
                Circle(SKETCH_16_R)
            with Locations(Location((20, -28.088110118, 0), (0, 0, 180))):
                Circle(SKETCH_16_R)
        extrude(amount=-CUT_EXTRUDE_5_DEPTH, mode=Mode.SUBTRACT)

    # 草图18 → 切除-拉伸7 (cut)
    with SkipClean():  # the faces are left unmerged after this step: merging them gives an invalid solid
        with BuildSketch(Plane(origin=(0, 0, 0), x_dir=(-1, 0, 0), z_dir=(0, 0, -1))):
            with Locations((75, 75)):
                Circle(SKETCH_18_R)
            with Locations((25, 75)):
                Circle(SKETCH_18_R)
            with Locations((-25, 75)):
                Circle(SKETCH_18_R)
            with Locations((-25, 25)):
                Circle(SKETCH_18_R)
            with Locations((25, 25)):
                Circle(SKETCH_18_R)
            with Locations((75, 25)):
                Circle(SKETCH_18_R)
        extrude(amount=-CUT_EXTRUDE_7_DEPTH, mode=Mode.SUBTRACT)


solid = part.part
